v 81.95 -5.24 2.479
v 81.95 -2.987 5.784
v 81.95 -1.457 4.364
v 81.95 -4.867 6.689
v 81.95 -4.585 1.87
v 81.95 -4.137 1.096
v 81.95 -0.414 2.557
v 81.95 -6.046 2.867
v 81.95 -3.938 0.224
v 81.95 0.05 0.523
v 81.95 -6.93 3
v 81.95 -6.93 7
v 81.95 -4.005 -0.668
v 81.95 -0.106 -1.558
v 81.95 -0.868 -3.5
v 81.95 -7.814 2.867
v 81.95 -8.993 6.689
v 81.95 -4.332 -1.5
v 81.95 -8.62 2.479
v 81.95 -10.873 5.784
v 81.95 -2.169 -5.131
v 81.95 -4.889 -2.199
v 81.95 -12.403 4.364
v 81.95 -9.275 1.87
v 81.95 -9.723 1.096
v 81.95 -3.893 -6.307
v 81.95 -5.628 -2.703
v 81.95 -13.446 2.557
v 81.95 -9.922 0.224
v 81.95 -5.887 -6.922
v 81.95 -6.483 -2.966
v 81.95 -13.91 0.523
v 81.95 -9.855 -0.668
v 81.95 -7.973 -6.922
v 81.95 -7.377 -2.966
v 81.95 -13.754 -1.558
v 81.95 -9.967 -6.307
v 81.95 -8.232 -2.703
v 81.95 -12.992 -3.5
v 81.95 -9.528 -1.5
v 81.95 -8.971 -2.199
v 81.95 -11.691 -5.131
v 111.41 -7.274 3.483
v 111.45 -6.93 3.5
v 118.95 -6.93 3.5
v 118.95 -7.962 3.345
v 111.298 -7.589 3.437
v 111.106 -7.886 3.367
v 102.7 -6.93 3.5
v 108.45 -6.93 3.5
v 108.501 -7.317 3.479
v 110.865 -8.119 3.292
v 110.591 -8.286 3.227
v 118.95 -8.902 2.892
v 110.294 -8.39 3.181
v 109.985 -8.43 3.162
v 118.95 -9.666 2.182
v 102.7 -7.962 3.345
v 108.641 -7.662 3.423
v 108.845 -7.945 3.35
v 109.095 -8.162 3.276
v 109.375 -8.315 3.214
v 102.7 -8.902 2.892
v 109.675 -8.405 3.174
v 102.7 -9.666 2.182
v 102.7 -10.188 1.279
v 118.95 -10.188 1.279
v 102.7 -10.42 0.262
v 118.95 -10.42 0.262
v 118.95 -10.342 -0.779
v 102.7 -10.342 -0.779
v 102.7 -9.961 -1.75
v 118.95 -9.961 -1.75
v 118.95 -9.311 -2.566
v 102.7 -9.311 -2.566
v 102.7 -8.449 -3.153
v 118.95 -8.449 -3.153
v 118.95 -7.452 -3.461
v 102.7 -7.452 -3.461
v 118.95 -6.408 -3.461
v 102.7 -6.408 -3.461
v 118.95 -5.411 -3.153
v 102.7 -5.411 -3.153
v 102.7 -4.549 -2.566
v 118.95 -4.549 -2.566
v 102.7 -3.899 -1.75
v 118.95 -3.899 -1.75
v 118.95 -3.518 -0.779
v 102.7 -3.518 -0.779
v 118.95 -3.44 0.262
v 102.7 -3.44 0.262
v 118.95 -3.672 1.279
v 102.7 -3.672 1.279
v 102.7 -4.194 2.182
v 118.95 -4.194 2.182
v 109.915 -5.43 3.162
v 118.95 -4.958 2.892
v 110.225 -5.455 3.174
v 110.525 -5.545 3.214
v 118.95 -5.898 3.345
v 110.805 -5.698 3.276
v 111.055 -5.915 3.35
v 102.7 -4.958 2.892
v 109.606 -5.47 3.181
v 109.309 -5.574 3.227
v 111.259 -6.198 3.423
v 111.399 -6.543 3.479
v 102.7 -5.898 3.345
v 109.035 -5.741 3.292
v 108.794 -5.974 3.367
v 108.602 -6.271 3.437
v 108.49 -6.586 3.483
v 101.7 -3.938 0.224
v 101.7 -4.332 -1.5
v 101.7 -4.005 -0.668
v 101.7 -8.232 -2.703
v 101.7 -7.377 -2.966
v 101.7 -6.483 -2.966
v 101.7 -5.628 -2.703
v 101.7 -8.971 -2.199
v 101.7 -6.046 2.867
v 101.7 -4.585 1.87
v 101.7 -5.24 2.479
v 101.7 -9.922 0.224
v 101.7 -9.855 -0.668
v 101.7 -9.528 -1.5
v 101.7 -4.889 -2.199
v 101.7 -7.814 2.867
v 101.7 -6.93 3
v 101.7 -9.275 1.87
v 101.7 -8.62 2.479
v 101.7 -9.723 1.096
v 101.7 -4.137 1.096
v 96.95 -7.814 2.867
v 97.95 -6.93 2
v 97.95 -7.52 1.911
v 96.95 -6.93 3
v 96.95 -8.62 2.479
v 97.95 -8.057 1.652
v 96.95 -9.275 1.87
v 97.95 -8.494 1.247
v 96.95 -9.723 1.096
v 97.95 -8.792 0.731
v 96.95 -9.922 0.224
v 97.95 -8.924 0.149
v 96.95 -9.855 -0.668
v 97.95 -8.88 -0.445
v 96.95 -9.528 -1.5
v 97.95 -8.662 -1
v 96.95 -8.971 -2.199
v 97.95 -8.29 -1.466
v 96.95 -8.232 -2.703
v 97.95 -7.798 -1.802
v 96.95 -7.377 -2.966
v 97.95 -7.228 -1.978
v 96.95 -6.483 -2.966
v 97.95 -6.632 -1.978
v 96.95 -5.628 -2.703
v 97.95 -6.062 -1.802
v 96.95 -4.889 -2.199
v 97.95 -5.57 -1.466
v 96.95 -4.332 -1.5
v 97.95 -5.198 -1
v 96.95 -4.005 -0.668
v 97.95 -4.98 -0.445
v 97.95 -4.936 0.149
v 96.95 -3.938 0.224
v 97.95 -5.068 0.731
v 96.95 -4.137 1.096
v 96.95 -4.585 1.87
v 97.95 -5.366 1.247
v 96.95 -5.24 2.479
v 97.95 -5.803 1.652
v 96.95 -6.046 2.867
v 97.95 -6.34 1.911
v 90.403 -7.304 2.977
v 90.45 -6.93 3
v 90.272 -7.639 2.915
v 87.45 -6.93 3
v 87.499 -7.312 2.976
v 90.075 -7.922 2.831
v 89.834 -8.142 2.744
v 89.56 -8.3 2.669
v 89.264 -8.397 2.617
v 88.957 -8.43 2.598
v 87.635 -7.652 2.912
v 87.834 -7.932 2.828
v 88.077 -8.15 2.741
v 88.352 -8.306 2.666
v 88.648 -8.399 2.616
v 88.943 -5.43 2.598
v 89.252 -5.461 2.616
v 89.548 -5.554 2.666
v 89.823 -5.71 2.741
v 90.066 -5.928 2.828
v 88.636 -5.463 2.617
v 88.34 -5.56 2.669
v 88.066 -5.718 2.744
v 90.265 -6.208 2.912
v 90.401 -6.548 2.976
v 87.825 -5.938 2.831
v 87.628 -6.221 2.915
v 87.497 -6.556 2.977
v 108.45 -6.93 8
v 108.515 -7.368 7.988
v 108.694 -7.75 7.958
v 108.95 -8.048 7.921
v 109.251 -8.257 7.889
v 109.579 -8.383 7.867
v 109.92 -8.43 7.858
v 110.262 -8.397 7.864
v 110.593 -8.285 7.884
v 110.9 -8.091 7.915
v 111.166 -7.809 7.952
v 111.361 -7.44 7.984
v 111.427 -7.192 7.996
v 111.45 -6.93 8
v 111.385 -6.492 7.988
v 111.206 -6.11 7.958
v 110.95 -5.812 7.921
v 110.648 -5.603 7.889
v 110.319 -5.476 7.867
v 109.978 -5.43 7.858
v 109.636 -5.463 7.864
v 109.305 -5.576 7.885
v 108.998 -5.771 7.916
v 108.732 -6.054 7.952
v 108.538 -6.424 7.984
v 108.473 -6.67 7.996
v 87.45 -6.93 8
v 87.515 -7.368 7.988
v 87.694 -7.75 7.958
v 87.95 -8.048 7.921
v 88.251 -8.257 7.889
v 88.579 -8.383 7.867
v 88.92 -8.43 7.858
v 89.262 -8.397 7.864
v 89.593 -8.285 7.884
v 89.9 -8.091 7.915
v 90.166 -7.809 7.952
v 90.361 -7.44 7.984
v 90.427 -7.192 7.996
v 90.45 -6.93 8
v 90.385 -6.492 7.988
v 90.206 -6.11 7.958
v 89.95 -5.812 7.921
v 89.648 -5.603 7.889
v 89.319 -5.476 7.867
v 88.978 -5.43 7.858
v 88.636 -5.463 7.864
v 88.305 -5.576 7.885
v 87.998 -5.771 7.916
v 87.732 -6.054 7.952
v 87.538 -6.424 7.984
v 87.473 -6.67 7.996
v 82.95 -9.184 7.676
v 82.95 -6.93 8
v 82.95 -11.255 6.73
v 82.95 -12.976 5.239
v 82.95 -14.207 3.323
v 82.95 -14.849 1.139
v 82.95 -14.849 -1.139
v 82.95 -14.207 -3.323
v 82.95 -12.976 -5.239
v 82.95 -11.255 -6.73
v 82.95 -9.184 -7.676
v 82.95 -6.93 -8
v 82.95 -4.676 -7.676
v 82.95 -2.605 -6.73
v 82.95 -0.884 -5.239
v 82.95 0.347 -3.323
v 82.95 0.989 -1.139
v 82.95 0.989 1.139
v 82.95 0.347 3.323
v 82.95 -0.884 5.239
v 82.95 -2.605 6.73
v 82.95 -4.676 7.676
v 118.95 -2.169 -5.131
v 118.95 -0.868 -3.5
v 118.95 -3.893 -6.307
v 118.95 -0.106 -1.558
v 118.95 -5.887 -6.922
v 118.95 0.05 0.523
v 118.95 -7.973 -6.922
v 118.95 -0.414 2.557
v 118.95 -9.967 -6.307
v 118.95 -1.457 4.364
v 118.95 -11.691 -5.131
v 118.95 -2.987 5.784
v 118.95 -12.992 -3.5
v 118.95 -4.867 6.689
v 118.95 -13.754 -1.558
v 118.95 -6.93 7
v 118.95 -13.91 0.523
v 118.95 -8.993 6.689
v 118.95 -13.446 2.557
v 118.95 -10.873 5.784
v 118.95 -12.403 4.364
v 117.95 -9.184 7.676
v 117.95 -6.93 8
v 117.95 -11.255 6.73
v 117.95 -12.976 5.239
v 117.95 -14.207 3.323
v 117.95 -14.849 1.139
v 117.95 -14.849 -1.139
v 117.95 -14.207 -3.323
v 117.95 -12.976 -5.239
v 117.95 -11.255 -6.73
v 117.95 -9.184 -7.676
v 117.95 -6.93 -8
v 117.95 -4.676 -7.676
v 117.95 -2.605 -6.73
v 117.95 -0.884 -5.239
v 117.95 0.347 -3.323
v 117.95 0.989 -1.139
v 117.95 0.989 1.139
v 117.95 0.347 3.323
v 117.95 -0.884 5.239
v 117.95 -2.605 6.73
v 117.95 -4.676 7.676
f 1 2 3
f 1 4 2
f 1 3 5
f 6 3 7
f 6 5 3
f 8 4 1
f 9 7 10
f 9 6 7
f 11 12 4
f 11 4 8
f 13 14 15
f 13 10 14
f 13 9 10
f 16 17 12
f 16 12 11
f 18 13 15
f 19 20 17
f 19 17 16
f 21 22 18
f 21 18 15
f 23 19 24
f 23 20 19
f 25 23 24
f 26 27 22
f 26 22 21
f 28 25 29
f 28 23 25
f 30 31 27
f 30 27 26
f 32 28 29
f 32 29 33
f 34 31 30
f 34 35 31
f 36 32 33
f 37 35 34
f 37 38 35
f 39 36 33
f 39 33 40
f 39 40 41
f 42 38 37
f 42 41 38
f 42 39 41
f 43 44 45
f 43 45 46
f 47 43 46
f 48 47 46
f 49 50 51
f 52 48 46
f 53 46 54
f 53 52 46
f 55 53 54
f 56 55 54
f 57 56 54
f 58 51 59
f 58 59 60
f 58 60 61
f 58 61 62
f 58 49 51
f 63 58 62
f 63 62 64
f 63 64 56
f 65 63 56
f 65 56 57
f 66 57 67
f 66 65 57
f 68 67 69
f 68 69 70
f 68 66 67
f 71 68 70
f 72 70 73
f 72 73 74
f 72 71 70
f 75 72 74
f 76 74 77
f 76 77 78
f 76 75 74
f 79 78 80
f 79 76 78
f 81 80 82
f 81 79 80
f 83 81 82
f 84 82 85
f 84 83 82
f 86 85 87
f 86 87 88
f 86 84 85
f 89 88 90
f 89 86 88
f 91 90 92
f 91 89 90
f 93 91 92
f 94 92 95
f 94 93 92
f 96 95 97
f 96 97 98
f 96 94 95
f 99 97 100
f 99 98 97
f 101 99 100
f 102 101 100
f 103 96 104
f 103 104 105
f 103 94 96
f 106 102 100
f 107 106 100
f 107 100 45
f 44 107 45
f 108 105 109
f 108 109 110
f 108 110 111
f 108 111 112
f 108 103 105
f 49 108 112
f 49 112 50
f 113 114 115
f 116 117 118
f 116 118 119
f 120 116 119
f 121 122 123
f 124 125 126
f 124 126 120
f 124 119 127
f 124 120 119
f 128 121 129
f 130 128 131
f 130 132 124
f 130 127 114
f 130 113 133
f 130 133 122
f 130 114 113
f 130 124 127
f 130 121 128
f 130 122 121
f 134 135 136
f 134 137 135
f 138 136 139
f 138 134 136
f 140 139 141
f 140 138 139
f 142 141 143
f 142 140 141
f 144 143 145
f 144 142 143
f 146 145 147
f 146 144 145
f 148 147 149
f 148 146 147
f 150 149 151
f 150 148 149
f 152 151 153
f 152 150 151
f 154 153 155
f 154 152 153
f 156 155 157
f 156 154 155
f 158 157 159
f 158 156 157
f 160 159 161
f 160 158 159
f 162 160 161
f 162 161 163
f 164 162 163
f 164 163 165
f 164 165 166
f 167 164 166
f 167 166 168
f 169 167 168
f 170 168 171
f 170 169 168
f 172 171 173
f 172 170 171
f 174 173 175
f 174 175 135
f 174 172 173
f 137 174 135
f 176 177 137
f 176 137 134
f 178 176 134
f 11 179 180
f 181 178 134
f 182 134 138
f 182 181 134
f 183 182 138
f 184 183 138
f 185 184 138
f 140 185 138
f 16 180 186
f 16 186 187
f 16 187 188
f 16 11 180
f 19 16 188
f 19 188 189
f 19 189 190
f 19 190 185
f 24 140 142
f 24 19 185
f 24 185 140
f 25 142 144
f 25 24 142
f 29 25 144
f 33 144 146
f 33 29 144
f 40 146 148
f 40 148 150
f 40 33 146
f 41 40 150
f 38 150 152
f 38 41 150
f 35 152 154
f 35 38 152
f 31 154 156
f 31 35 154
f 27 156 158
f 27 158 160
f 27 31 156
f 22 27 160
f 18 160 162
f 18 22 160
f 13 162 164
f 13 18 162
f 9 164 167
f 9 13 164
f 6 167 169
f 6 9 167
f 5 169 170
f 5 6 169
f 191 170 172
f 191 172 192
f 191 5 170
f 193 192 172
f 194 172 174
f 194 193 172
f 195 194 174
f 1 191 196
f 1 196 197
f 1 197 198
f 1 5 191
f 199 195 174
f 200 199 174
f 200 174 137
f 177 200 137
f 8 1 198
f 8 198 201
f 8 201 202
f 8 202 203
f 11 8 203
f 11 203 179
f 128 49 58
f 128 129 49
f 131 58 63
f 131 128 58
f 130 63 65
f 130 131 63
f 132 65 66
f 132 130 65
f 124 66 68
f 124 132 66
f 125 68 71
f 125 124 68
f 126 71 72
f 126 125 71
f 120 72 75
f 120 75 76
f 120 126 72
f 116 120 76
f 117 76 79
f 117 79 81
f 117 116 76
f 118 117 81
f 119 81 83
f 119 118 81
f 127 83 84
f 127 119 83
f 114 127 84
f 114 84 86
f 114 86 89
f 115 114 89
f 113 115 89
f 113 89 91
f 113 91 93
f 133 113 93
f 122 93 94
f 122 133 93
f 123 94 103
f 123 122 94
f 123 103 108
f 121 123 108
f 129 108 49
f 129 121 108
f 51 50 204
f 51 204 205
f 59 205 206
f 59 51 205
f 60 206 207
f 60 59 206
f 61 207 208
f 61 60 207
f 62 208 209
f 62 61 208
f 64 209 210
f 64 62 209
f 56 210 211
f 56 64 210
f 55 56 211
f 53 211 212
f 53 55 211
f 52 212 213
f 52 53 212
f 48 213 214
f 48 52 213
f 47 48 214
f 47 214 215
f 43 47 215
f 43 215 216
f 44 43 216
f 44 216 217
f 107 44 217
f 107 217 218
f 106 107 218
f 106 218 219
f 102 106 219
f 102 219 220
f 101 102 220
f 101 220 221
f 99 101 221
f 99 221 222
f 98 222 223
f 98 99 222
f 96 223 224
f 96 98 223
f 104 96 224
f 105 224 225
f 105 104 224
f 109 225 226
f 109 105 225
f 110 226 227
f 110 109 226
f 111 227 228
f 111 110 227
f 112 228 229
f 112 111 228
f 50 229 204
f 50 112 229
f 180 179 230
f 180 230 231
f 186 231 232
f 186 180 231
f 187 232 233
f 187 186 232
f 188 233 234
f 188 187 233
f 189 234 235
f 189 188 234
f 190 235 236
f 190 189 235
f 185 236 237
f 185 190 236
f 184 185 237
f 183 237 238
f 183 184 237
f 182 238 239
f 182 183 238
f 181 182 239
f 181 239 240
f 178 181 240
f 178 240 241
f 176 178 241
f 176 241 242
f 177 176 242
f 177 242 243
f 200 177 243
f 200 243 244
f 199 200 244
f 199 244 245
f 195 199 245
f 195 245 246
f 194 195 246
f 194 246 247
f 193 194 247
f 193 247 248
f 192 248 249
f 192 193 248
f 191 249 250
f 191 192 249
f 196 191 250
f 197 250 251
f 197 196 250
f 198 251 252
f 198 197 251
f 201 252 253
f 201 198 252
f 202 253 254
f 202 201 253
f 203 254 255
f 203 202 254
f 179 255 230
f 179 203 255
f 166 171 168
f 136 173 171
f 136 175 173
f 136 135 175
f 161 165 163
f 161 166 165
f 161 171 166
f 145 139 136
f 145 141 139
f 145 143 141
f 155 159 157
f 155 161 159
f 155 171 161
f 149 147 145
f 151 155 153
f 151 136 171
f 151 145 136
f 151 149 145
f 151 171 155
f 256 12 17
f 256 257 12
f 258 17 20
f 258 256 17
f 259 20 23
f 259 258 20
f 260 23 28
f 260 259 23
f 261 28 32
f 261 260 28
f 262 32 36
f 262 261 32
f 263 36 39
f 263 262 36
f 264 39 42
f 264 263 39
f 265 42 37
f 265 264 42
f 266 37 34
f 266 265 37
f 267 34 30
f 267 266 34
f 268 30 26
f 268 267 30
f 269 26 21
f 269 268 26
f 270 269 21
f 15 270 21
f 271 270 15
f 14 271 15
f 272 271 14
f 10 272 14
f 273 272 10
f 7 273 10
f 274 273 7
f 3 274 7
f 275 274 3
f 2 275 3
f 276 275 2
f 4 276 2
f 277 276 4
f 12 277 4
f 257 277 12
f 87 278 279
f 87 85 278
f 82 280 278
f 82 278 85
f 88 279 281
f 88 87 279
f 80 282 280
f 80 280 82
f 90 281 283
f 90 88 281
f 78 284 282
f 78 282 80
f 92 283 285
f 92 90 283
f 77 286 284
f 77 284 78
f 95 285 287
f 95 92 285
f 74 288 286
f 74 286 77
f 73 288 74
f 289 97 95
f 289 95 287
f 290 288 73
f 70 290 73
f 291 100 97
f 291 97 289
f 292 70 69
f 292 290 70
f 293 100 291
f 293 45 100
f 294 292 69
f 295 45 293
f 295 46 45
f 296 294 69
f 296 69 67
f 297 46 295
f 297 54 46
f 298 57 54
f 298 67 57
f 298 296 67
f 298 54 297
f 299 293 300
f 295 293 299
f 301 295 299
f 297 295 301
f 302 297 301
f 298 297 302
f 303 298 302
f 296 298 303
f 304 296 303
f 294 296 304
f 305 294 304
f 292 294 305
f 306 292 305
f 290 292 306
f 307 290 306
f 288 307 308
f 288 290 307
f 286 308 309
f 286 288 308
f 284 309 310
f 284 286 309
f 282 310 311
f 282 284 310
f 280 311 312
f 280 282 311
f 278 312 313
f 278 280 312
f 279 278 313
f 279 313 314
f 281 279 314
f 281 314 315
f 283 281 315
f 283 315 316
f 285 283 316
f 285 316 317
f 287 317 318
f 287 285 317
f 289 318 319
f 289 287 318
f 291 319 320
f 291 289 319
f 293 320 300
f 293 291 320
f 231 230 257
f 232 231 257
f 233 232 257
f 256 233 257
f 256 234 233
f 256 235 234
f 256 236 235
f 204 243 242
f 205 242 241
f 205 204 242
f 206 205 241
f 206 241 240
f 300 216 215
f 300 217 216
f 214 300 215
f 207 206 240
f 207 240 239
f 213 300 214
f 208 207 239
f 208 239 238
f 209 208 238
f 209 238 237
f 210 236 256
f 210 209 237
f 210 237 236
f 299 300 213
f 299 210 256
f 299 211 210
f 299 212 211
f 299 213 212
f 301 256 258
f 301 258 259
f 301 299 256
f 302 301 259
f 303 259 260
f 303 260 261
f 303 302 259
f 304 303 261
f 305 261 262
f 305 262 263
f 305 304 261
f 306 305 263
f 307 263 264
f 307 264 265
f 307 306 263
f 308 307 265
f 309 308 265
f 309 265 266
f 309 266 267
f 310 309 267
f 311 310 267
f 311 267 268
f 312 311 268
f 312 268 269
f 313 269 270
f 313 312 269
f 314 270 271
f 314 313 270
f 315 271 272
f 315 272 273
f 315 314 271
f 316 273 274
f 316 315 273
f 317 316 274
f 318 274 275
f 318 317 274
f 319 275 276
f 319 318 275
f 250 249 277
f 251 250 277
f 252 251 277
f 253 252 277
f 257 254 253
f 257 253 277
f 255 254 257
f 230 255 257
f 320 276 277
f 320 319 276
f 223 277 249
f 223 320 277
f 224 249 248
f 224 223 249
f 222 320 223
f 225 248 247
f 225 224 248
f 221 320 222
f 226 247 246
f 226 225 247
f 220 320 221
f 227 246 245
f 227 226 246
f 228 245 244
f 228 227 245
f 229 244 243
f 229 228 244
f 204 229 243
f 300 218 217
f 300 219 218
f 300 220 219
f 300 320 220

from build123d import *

# Parameters (mm, degrees)
ESBO_O2_R             = 1.5
CORTE_EXTRUS_O1_DEPTH = 121.149937162


with BuildPart() as part:
    # Esboço1 → Revolução1 (revolve)
    with BuildSketch(Plane.XY, mode=Mode.PRIVATE) as revolu_o1_sk:
        Polygon((81.95, -3.93), (81.95, 0.07), (82.95, 1.07), (117.95, 1.07), (118.95, 0.07), (118.95, -3.43), (102.7, -3.43), (101.7, -3.93), (101.7, -6.93), (97.95, -6.93), (97.95, -4.93), (96.95, -3.93), align=None)
    revolve(revolu_o1_sk.sketch.rotate(Axis((81.95, -6.93, 0), (1, 0, 0)), 90), axis=Axis((81.95, -6.93, 0), (1, 0, 0)))

    # Esboço2 → Corte-extrusão1 (cut, through all)
    with BuildSketch(Plane.XY):
        with Locations(Location((88.95, -6.93, 0), (0, 0, 180))):
            Circle(ESBO_O2_R)
        with Locations(Location((109.95, -6.93, 0), (0, 0, 180))):
            Circle(ESBO_O2_R)
    extrude(amount=CORTE_EXTRUS_O1_DEPTH, mode=Mode.SUBTRACT)


solid = part.part
